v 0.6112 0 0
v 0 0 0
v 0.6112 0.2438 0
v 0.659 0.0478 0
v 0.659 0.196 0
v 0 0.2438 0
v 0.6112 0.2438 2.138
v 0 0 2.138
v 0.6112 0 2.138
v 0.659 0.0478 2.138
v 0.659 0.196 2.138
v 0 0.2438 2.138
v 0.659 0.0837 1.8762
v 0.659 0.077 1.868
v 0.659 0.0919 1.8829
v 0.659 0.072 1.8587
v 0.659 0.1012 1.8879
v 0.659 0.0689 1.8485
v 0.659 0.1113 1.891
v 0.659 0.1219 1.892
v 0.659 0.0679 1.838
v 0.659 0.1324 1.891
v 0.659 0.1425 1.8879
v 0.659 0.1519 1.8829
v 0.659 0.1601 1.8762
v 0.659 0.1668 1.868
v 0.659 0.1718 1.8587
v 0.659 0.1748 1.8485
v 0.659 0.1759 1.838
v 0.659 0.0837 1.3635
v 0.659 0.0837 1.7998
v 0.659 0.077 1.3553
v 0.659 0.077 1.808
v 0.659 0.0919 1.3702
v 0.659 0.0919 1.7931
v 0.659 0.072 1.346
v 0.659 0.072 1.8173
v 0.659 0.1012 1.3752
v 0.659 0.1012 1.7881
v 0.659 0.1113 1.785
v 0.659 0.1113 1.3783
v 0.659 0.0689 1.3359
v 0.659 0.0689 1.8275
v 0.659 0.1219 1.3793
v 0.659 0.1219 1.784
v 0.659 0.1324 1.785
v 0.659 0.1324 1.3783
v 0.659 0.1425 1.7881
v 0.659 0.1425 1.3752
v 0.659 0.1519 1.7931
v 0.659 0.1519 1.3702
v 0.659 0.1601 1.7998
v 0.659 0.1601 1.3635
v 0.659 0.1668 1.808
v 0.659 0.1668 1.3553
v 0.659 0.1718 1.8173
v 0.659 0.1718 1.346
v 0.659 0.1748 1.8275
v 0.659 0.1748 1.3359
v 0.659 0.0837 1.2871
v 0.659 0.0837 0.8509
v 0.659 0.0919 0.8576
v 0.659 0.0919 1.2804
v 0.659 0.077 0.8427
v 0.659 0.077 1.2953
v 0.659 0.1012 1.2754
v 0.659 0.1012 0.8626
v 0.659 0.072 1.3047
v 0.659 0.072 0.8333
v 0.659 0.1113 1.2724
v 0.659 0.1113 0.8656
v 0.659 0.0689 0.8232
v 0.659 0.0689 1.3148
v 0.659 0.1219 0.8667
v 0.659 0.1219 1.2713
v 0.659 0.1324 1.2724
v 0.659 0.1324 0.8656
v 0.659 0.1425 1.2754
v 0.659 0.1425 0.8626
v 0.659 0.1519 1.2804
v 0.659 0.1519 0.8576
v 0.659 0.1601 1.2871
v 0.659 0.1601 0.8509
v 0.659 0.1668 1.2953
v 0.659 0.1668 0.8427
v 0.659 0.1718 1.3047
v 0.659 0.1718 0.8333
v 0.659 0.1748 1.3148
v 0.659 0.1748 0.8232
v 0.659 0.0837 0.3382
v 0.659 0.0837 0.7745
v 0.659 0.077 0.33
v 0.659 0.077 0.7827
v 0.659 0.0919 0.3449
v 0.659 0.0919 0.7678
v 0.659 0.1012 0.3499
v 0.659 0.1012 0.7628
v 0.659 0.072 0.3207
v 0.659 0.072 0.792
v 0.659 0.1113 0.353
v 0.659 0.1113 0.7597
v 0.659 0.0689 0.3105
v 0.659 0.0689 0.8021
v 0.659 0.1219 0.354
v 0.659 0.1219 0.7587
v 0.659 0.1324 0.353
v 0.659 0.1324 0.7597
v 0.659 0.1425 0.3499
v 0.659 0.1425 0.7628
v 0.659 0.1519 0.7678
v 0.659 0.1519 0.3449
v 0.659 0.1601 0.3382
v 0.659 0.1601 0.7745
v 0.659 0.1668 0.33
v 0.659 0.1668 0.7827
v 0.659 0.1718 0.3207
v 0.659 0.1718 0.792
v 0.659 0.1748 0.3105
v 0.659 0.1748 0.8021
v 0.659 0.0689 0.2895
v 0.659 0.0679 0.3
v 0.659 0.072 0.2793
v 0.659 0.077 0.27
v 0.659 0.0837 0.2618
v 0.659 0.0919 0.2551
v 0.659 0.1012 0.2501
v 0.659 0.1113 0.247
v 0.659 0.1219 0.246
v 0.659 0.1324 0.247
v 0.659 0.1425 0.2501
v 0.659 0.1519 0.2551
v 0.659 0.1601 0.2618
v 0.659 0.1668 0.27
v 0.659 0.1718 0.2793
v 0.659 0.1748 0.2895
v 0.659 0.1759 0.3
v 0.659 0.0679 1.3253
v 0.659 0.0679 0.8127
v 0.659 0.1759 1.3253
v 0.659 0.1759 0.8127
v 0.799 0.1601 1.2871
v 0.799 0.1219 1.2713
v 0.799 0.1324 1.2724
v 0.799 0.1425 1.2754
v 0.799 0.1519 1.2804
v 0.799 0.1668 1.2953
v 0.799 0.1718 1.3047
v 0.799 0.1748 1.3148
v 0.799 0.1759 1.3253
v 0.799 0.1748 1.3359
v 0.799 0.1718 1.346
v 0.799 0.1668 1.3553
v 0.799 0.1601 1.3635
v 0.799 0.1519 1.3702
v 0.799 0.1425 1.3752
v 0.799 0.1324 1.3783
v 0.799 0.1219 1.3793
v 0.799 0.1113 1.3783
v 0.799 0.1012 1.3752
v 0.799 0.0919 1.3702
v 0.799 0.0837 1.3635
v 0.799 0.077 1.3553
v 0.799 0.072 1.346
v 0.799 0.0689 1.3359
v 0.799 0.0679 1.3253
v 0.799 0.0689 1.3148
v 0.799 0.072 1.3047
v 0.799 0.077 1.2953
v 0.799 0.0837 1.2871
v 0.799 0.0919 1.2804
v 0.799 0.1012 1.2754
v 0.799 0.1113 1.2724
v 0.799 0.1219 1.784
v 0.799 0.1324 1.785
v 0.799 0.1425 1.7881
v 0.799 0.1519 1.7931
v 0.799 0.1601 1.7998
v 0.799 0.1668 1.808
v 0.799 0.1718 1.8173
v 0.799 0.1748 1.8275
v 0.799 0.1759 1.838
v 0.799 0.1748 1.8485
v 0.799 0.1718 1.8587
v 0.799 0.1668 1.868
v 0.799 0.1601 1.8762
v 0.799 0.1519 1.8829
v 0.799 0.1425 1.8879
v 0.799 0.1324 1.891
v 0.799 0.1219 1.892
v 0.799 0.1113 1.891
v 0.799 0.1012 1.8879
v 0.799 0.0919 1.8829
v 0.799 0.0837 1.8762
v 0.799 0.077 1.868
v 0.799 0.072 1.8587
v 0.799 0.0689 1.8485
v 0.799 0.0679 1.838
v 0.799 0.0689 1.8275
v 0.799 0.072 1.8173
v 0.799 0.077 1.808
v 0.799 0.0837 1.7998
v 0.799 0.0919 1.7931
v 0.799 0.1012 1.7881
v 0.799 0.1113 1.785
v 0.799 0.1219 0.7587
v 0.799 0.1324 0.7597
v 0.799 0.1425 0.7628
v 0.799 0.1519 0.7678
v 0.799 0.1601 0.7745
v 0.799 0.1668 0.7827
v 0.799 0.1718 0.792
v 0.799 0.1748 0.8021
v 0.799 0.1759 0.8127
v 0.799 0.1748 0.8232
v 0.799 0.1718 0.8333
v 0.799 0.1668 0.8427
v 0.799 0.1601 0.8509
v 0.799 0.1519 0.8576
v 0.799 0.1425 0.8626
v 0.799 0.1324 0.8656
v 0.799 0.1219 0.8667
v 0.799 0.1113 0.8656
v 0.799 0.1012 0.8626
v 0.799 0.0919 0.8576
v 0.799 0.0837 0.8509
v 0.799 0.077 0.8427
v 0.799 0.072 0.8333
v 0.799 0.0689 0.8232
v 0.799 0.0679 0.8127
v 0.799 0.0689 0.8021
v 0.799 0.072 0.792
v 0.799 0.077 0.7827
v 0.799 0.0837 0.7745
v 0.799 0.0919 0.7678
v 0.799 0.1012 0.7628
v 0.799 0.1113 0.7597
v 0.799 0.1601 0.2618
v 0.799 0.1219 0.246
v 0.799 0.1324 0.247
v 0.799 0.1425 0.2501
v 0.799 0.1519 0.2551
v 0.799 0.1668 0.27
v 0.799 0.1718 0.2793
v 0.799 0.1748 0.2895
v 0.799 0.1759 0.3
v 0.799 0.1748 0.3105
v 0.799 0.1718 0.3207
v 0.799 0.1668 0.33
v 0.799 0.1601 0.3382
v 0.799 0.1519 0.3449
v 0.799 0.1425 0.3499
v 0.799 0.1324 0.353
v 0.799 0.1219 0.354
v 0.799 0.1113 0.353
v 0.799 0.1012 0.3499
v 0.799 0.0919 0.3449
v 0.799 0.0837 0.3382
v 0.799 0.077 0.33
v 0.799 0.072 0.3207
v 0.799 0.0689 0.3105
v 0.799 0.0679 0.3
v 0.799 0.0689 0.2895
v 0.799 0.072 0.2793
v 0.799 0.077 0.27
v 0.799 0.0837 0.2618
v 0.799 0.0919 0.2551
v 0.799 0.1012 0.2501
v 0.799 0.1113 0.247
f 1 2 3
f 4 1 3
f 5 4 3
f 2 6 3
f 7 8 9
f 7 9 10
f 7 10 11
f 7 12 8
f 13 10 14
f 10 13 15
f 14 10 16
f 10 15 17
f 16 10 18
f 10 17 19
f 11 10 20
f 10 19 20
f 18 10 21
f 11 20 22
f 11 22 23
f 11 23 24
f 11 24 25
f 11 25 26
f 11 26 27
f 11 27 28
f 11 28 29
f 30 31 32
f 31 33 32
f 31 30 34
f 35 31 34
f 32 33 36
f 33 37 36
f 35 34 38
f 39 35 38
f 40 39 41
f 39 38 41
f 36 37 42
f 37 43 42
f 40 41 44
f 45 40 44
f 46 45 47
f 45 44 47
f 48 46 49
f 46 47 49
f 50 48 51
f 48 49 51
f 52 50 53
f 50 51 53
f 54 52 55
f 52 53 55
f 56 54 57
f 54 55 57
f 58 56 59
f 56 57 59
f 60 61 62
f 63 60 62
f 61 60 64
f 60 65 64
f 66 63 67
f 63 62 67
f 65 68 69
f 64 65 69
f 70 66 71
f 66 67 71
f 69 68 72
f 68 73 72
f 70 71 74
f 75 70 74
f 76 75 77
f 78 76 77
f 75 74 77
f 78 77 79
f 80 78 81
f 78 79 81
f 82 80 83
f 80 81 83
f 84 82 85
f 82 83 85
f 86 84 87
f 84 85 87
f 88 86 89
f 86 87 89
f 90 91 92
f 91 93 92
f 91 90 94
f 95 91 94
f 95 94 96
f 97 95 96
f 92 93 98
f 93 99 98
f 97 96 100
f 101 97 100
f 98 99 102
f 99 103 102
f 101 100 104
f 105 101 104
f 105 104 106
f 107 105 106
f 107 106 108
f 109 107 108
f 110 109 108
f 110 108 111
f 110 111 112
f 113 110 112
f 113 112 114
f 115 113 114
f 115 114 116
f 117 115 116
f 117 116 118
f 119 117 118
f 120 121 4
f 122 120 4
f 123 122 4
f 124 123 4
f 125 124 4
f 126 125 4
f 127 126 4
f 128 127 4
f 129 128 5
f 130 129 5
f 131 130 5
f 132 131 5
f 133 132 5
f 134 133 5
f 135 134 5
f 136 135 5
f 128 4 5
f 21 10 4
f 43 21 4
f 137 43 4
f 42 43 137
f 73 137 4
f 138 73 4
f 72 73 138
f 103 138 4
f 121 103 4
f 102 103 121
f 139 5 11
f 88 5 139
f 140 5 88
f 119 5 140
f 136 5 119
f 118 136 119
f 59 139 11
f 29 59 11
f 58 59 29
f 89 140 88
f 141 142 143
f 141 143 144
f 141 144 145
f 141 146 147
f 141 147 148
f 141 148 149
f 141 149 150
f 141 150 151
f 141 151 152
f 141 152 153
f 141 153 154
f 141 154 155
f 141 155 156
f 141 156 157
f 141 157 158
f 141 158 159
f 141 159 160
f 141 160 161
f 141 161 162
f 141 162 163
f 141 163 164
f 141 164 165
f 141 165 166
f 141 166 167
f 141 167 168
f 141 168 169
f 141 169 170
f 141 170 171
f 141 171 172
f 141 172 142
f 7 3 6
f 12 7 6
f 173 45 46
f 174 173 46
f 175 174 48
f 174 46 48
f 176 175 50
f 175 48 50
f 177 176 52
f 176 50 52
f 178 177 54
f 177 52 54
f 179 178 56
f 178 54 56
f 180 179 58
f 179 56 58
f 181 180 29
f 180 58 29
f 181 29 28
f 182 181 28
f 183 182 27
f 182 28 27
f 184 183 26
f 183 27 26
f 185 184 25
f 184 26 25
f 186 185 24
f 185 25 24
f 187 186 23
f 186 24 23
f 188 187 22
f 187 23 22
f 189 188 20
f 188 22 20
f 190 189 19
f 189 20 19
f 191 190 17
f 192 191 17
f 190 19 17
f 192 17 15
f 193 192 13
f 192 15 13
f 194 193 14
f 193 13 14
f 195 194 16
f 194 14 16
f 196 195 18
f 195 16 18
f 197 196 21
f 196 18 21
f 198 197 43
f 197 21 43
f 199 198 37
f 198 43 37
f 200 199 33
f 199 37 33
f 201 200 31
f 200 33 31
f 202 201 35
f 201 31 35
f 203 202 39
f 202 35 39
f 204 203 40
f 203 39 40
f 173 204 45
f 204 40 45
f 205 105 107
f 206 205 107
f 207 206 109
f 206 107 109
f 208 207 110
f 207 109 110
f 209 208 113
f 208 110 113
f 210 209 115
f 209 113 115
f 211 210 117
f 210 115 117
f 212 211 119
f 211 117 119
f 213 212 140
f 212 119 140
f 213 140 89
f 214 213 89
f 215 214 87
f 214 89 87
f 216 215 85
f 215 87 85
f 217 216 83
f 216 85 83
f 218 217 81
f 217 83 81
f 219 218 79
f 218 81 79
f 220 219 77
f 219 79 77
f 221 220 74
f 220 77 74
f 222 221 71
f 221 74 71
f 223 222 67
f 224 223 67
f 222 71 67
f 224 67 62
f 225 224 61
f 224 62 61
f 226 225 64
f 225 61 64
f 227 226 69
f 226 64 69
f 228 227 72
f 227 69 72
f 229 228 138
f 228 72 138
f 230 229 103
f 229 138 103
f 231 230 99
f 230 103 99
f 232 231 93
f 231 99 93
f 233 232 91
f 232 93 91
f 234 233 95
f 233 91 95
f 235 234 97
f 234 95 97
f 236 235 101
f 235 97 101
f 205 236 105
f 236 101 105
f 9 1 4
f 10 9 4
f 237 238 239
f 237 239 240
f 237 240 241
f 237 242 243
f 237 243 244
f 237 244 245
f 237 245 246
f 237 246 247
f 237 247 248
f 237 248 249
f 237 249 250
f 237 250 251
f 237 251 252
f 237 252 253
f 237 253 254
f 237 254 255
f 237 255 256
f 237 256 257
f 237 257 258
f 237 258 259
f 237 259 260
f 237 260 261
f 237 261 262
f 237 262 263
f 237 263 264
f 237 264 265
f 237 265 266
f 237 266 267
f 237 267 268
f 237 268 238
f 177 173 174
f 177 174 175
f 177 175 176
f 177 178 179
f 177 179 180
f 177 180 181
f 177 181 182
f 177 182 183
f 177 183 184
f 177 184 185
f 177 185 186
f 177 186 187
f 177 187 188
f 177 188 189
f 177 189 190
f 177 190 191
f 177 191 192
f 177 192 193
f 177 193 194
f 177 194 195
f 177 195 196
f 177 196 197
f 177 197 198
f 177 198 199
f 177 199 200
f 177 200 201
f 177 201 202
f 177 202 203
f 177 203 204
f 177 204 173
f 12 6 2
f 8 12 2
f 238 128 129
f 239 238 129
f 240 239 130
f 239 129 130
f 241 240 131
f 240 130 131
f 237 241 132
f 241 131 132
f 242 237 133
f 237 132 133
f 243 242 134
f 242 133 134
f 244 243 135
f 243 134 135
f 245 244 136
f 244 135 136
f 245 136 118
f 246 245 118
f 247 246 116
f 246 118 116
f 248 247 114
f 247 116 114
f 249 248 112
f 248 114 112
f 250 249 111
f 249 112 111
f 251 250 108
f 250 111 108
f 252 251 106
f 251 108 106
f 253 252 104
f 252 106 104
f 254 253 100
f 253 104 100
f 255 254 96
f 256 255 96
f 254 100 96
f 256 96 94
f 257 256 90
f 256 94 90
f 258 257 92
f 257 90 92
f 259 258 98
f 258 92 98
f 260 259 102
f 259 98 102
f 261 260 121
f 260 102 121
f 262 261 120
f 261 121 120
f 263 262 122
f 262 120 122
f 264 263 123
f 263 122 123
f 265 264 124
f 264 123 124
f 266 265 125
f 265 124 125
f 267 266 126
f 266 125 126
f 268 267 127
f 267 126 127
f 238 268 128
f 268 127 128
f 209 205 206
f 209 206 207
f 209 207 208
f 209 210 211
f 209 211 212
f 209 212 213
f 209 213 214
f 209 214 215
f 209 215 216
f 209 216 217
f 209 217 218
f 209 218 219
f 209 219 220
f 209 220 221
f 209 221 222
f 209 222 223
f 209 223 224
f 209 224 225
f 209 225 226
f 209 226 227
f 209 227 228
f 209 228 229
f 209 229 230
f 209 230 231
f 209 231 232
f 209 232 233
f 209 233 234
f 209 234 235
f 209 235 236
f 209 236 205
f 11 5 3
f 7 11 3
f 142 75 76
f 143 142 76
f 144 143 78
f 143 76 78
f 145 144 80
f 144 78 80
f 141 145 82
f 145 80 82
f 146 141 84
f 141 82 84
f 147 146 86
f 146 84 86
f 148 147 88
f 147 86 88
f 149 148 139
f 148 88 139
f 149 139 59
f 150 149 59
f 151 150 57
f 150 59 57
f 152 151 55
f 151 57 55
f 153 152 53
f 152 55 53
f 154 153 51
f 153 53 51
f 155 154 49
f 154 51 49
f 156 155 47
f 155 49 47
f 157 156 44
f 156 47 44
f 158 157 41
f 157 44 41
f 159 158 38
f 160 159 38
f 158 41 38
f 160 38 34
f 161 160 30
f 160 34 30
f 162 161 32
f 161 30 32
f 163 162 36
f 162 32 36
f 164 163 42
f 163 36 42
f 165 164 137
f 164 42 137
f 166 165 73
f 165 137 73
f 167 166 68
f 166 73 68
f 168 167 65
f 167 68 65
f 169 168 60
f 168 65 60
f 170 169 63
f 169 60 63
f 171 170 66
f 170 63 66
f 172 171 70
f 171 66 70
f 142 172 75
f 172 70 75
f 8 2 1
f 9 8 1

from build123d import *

# Parameters (mm, degrees)
BOSS_EXTRUDE1_DEPTH = 2.138
SKETCH2_R           = 0.0540073
BOSS_EXTRUDE2_DEPTH = 0.14


with BuildPart() as part:
    # Sketch1 → Boss-Extrude1 (new body)
    with BuildSketch(Plane.XY):
        Polygon((0, 0), (0.61123, 0), (0.659, 0.04777), (0.659, 0.19598), (0.61123, 0.24375), (0, 0.24375), align=None)
    extrude(amount=BOSS_EXTRUDE1_DEPTH)

    # Sketch2 → Boss-Extrude2 (add)
    with BuildSketch(Plane(origin=(0.659, 0, 0), x_dir=(0, 0, -1), z_dir=(1, 0, 0))):
        with Locations((-1.838, 0.121875)):
            Circle(SKETCH2_R)
        with Locations((-1.325333333, 0.121875)):
            Circle(SKETCH2_R)
        with Locations((-0.812666667, 0.121875)):
            Circle(SKETCH2_R)
        with Locations((-0.3, 0.121875)):
            Circle(SKETCH2_R)
    extrude(amount=BOSS_EXTRUDE2_DEPTH)


solid = part.part
